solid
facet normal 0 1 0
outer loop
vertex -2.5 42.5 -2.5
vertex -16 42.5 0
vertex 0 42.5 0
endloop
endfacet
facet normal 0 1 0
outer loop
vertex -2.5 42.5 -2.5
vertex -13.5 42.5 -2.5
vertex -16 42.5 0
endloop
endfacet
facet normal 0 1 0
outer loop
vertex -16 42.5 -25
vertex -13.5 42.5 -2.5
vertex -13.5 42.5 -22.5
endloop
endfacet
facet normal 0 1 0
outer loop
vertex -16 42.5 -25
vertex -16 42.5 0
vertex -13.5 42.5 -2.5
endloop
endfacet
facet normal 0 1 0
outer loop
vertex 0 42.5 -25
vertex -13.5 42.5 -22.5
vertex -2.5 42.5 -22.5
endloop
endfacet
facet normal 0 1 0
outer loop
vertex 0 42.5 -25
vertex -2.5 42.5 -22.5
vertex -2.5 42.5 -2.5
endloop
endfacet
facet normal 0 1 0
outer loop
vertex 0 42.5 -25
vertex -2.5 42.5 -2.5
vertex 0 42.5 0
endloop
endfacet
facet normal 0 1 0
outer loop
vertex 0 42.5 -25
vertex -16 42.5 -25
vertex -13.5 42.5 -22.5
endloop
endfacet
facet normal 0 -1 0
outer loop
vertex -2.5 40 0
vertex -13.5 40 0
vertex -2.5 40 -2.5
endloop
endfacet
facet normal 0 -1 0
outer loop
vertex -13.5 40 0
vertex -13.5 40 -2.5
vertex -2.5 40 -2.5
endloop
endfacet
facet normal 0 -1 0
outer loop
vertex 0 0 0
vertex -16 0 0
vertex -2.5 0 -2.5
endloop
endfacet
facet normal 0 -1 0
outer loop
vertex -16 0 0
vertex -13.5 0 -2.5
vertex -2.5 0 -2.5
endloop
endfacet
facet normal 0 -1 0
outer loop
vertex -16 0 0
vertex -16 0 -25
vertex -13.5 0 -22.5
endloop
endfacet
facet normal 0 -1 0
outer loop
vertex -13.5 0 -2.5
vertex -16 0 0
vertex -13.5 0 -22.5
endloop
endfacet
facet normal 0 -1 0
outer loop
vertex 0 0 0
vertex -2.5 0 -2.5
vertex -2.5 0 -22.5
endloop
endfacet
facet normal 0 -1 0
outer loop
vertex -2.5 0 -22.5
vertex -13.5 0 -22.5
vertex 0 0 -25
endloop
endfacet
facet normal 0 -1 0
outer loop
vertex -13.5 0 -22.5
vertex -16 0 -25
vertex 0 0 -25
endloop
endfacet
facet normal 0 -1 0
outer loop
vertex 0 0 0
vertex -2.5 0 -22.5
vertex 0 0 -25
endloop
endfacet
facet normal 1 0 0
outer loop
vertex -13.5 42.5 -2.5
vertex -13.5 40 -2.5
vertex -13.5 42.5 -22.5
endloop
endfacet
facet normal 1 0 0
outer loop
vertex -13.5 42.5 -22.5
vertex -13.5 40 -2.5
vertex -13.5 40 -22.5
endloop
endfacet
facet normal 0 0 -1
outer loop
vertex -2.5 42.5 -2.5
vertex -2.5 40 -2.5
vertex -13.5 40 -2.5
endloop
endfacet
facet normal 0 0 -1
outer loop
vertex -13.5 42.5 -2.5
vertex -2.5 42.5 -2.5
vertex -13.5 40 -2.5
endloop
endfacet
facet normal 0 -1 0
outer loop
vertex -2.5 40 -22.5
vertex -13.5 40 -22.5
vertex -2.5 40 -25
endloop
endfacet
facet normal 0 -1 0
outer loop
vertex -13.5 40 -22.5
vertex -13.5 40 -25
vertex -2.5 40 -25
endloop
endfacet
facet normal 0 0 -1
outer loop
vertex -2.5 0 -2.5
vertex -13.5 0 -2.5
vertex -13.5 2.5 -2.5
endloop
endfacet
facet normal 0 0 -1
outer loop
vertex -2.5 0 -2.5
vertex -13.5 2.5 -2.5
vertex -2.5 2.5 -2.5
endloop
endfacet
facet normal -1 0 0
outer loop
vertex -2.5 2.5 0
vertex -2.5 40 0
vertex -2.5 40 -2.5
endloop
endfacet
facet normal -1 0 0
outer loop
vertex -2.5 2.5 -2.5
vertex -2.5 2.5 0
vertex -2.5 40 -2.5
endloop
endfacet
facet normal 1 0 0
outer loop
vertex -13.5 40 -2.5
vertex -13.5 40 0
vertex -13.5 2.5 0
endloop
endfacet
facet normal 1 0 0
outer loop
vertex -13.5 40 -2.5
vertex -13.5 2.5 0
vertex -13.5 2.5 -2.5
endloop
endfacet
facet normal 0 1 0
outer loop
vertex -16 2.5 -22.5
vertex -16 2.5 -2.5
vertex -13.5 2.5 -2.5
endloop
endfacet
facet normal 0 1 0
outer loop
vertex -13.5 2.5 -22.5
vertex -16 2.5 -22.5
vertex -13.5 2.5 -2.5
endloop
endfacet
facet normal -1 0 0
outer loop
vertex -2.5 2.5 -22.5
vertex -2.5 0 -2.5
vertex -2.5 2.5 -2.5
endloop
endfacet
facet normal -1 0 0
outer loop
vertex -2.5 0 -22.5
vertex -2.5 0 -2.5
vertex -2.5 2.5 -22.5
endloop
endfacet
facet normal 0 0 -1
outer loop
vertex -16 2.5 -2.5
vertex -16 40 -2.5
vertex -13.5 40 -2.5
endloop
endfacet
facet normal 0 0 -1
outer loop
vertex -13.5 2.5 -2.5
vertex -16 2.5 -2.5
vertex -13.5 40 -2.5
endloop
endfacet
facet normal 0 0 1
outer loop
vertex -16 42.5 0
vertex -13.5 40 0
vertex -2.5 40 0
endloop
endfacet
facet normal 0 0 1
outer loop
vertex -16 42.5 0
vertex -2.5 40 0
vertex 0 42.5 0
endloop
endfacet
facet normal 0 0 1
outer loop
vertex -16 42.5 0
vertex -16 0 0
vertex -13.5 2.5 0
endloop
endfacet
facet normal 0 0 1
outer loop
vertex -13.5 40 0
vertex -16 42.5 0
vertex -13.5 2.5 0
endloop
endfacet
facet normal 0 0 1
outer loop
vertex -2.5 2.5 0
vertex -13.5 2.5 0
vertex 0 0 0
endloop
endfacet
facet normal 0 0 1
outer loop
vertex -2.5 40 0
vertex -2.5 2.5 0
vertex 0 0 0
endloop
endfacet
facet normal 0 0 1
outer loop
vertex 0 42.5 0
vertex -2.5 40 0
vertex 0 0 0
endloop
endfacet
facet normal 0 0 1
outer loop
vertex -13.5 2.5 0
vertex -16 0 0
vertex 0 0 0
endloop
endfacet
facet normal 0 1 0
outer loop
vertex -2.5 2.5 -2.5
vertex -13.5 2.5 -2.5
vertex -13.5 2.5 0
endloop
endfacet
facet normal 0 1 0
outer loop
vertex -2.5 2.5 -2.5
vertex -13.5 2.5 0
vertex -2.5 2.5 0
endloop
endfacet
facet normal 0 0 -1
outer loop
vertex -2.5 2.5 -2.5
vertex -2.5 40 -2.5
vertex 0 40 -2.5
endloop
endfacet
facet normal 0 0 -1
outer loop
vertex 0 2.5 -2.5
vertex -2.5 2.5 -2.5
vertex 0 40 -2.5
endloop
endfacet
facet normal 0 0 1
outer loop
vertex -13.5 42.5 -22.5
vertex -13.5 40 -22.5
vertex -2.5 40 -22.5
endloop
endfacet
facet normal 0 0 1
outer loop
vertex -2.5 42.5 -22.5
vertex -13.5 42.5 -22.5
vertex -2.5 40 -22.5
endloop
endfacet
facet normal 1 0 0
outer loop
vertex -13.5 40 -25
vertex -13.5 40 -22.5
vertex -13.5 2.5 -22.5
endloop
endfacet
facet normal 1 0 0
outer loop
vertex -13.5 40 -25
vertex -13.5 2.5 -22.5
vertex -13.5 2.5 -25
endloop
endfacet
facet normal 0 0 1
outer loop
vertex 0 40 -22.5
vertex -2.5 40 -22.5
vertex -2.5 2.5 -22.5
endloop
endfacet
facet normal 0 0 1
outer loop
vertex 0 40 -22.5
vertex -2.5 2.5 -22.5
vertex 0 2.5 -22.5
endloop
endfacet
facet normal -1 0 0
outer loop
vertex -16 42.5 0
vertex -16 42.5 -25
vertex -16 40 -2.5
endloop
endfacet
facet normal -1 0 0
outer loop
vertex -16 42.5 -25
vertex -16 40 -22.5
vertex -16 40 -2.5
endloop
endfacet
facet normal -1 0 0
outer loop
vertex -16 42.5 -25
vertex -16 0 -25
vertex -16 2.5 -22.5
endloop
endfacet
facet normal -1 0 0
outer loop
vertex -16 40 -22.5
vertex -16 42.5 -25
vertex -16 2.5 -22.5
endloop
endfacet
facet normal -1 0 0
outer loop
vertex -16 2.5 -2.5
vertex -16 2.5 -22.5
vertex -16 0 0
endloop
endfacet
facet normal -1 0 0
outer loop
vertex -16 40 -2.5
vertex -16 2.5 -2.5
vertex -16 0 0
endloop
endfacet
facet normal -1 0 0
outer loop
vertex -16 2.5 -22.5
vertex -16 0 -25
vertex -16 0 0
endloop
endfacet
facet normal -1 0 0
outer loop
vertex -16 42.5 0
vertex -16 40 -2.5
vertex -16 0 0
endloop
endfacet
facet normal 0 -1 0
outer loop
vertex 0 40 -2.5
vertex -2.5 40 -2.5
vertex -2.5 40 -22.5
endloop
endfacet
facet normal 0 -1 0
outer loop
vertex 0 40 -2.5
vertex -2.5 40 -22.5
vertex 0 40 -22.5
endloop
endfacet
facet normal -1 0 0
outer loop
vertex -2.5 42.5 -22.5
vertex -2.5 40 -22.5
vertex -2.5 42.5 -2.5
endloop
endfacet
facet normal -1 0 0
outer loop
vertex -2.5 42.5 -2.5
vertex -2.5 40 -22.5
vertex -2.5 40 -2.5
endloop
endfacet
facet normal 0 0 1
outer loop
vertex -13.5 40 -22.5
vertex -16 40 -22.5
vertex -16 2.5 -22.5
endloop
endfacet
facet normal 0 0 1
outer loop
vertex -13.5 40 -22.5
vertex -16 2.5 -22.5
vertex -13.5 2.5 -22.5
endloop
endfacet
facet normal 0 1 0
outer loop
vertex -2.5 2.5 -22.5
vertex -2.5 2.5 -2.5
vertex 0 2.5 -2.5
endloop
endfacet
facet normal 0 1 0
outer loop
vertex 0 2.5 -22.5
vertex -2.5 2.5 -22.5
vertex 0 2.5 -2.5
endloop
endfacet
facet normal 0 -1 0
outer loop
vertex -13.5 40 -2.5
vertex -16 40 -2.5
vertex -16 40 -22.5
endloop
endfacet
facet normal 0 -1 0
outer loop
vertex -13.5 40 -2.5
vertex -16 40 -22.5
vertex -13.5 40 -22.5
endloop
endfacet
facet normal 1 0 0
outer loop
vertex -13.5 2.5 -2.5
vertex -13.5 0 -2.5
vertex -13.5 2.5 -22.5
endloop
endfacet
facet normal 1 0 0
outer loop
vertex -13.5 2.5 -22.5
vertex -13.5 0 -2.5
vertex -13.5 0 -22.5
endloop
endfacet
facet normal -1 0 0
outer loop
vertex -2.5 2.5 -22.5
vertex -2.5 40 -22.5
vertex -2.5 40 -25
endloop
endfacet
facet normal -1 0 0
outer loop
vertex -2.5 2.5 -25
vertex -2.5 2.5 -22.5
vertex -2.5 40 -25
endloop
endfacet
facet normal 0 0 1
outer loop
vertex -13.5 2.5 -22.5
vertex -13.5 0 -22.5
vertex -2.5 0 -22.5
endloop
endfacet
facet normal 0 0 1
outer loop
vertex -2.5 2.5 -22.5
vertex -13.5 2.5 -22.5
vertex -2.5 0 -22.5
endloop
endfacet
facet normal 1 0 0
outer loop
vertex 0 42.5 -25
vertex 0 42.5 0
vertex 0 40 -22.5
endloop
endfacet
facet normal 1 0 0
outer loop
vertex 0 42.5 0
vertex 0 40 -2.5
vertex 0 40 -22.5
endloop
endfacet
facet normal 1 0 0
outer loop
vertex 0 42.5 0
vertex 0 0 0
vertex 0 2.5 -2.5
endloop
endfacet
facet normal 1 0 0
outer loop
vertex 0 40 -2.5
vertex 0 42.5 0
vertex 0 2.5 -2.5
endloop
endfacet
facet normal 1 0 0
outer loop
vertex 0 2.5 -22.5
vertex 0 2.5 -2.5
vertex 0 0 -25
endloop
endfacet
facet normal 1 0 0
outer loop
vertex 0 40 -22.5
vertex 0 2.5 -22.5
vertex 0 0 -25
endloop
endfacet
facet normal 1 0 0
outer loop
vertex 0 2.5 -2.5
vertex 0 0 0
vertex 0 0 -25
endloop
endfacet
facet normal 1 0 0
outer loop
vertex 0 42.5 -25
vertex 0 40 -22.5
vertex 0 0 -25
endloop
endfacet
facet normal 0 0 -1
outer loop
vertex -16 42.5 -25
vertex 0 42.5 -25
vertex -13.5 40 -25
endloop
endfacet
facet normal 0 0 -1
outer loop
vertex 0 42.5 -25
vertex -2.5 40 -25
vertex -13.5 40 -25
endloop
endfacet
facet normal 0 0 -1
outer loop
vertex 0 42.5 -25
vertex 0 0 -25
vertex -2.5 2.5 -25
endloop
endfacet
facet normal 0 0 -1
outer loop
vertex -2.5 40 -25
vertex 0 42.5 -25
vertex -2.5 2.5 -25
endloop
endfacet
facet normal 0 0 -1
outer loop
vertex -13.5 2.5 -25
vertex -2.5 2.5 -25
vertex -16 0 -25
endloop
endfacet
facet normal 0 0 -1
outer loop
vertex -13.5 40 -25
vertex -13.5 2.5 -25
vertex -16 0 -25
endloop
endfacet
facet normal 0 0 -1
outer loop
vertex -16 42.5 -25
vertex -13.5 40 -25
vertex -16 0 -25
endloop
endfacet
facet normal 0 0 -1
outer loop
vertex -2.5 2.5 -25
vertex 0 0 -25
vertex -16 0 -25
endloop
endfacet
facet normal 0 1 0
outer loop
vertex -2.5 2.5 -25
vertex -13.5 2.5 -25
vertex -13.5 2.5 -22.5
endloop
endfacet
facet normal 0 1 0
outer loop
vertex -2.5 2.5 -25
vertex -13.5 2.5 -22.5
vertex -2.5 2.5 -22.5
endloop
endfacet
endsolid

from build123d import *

# Parameters (mm, degrees)
SKETCH1_W           = 16
SKETCH1_H           = 25
SKETCH1_W_2         = 11
SKETCH1_H_2         = 20
BOSS_EXTRUDE2_DEPTH = 2.5
SKETCH1_4_W         = 2.5
SKETCH1_4_H         = 2.5
BOSS_EXTRUDE3_DEPTH = 40
BOSS_EXTRUDE4_START = 40
SKETCH1_5_W         = 2.5
SKETCH1_5_H         = 20
SKETCH1_5_H_2       = 2.5
SKETCH1_5_W_2       = 11
BOSS_EXTRUDE4_DEPTH = 2.5


with BuildPart() as part:
    # Sketch1 → Boss-Extrude2 (new body)
    with BuildSketch(Plane(origin=(0, 0, 0), x_dir=(1, 0, 0), z_dir=(0, 1, 0))):
        with Locations((-8, 12.5)):
            Rectangle(SKETCH1_W, SKETCH1_H)
        with Locations((-8, 12.5)):
            Rectangle(SKETCH1_W_2, SKETCH1_H_2, mode=Mode.SUBTRACT)
    extrude(amount=BOSS_EXTRUDE2_DEPTH)

    # Sketch1_4 → Boss-Extrude3 (add)
    with BuildSketch(Plane(origin=(0, 0, 0), x_dir=(1, 0, 0), z_dir=(0, 1, 0))):
        with Locations((-14.75, 23.75)):
            Rectangle(SKETCH1_4_W, SKETCH1_4_H)
        with Locations((-14.75, 1.25)):
            Rectangle(SKETCH1_4_W, SKETCH1_4_H)
        with Locations((-1.25, 1.25)):
            Rectangle(SKETCH1_4_W, SKETCH1_4_H)
        with Locations((-1.25, 23.75)):
            Rectangle(SKETCH1_4_W, SKETCH1_4_H)
    extrude(amount=BOSS_EXTRUDE3_DEPTH)

    # Sketch1_5 → Boss-Extrude4 (add)
    with BuildSketch(Plane(origin=(0, 0, 0), x_dir=(1, 0, 0), z_dir=(0, 1, 0)).offset(BOSS_EXTRUDE4_START)):
        with Locations((-1.25, 12.5)):
            Rectangle(SKETCH1_5_W, SKETCH1_5_H)
        with Locations((-1.25, 1.25)):
            Rectangle(SKETCH1_5_W, SKETCH1_5_H_2)
        with Locations((-8, 1.25)):
            Rectangle(SKETCH1_5_W_2, SKETCH1_5_H_2)
        with Locations((-14.75, 1.25)):
            Rectangle(SKETCH1_5_W, SKETCH1_5_H_2)
        with Locations((-14.75, 12.5)):
            Rectangle(SKETCH1_5_W, SKETCH1_5_H)
        with Locations((-14.75, 23.75)):
            Rectangle(SKETCH1_5_W, SKETCH1_5_H_2)
        with Locations((-8, 23.75)):
            Rectangle(SKETCH1_5_W_2, SKETCH1_5_H_2)
        with Locations((-1.25, 23.75)):
            Rectangle(SKETCH1_5_W, SKETCH1_5_H_2)
    extrude(amount=BOSS_EXTRUDE4_DEPTH)


solid = part.part
